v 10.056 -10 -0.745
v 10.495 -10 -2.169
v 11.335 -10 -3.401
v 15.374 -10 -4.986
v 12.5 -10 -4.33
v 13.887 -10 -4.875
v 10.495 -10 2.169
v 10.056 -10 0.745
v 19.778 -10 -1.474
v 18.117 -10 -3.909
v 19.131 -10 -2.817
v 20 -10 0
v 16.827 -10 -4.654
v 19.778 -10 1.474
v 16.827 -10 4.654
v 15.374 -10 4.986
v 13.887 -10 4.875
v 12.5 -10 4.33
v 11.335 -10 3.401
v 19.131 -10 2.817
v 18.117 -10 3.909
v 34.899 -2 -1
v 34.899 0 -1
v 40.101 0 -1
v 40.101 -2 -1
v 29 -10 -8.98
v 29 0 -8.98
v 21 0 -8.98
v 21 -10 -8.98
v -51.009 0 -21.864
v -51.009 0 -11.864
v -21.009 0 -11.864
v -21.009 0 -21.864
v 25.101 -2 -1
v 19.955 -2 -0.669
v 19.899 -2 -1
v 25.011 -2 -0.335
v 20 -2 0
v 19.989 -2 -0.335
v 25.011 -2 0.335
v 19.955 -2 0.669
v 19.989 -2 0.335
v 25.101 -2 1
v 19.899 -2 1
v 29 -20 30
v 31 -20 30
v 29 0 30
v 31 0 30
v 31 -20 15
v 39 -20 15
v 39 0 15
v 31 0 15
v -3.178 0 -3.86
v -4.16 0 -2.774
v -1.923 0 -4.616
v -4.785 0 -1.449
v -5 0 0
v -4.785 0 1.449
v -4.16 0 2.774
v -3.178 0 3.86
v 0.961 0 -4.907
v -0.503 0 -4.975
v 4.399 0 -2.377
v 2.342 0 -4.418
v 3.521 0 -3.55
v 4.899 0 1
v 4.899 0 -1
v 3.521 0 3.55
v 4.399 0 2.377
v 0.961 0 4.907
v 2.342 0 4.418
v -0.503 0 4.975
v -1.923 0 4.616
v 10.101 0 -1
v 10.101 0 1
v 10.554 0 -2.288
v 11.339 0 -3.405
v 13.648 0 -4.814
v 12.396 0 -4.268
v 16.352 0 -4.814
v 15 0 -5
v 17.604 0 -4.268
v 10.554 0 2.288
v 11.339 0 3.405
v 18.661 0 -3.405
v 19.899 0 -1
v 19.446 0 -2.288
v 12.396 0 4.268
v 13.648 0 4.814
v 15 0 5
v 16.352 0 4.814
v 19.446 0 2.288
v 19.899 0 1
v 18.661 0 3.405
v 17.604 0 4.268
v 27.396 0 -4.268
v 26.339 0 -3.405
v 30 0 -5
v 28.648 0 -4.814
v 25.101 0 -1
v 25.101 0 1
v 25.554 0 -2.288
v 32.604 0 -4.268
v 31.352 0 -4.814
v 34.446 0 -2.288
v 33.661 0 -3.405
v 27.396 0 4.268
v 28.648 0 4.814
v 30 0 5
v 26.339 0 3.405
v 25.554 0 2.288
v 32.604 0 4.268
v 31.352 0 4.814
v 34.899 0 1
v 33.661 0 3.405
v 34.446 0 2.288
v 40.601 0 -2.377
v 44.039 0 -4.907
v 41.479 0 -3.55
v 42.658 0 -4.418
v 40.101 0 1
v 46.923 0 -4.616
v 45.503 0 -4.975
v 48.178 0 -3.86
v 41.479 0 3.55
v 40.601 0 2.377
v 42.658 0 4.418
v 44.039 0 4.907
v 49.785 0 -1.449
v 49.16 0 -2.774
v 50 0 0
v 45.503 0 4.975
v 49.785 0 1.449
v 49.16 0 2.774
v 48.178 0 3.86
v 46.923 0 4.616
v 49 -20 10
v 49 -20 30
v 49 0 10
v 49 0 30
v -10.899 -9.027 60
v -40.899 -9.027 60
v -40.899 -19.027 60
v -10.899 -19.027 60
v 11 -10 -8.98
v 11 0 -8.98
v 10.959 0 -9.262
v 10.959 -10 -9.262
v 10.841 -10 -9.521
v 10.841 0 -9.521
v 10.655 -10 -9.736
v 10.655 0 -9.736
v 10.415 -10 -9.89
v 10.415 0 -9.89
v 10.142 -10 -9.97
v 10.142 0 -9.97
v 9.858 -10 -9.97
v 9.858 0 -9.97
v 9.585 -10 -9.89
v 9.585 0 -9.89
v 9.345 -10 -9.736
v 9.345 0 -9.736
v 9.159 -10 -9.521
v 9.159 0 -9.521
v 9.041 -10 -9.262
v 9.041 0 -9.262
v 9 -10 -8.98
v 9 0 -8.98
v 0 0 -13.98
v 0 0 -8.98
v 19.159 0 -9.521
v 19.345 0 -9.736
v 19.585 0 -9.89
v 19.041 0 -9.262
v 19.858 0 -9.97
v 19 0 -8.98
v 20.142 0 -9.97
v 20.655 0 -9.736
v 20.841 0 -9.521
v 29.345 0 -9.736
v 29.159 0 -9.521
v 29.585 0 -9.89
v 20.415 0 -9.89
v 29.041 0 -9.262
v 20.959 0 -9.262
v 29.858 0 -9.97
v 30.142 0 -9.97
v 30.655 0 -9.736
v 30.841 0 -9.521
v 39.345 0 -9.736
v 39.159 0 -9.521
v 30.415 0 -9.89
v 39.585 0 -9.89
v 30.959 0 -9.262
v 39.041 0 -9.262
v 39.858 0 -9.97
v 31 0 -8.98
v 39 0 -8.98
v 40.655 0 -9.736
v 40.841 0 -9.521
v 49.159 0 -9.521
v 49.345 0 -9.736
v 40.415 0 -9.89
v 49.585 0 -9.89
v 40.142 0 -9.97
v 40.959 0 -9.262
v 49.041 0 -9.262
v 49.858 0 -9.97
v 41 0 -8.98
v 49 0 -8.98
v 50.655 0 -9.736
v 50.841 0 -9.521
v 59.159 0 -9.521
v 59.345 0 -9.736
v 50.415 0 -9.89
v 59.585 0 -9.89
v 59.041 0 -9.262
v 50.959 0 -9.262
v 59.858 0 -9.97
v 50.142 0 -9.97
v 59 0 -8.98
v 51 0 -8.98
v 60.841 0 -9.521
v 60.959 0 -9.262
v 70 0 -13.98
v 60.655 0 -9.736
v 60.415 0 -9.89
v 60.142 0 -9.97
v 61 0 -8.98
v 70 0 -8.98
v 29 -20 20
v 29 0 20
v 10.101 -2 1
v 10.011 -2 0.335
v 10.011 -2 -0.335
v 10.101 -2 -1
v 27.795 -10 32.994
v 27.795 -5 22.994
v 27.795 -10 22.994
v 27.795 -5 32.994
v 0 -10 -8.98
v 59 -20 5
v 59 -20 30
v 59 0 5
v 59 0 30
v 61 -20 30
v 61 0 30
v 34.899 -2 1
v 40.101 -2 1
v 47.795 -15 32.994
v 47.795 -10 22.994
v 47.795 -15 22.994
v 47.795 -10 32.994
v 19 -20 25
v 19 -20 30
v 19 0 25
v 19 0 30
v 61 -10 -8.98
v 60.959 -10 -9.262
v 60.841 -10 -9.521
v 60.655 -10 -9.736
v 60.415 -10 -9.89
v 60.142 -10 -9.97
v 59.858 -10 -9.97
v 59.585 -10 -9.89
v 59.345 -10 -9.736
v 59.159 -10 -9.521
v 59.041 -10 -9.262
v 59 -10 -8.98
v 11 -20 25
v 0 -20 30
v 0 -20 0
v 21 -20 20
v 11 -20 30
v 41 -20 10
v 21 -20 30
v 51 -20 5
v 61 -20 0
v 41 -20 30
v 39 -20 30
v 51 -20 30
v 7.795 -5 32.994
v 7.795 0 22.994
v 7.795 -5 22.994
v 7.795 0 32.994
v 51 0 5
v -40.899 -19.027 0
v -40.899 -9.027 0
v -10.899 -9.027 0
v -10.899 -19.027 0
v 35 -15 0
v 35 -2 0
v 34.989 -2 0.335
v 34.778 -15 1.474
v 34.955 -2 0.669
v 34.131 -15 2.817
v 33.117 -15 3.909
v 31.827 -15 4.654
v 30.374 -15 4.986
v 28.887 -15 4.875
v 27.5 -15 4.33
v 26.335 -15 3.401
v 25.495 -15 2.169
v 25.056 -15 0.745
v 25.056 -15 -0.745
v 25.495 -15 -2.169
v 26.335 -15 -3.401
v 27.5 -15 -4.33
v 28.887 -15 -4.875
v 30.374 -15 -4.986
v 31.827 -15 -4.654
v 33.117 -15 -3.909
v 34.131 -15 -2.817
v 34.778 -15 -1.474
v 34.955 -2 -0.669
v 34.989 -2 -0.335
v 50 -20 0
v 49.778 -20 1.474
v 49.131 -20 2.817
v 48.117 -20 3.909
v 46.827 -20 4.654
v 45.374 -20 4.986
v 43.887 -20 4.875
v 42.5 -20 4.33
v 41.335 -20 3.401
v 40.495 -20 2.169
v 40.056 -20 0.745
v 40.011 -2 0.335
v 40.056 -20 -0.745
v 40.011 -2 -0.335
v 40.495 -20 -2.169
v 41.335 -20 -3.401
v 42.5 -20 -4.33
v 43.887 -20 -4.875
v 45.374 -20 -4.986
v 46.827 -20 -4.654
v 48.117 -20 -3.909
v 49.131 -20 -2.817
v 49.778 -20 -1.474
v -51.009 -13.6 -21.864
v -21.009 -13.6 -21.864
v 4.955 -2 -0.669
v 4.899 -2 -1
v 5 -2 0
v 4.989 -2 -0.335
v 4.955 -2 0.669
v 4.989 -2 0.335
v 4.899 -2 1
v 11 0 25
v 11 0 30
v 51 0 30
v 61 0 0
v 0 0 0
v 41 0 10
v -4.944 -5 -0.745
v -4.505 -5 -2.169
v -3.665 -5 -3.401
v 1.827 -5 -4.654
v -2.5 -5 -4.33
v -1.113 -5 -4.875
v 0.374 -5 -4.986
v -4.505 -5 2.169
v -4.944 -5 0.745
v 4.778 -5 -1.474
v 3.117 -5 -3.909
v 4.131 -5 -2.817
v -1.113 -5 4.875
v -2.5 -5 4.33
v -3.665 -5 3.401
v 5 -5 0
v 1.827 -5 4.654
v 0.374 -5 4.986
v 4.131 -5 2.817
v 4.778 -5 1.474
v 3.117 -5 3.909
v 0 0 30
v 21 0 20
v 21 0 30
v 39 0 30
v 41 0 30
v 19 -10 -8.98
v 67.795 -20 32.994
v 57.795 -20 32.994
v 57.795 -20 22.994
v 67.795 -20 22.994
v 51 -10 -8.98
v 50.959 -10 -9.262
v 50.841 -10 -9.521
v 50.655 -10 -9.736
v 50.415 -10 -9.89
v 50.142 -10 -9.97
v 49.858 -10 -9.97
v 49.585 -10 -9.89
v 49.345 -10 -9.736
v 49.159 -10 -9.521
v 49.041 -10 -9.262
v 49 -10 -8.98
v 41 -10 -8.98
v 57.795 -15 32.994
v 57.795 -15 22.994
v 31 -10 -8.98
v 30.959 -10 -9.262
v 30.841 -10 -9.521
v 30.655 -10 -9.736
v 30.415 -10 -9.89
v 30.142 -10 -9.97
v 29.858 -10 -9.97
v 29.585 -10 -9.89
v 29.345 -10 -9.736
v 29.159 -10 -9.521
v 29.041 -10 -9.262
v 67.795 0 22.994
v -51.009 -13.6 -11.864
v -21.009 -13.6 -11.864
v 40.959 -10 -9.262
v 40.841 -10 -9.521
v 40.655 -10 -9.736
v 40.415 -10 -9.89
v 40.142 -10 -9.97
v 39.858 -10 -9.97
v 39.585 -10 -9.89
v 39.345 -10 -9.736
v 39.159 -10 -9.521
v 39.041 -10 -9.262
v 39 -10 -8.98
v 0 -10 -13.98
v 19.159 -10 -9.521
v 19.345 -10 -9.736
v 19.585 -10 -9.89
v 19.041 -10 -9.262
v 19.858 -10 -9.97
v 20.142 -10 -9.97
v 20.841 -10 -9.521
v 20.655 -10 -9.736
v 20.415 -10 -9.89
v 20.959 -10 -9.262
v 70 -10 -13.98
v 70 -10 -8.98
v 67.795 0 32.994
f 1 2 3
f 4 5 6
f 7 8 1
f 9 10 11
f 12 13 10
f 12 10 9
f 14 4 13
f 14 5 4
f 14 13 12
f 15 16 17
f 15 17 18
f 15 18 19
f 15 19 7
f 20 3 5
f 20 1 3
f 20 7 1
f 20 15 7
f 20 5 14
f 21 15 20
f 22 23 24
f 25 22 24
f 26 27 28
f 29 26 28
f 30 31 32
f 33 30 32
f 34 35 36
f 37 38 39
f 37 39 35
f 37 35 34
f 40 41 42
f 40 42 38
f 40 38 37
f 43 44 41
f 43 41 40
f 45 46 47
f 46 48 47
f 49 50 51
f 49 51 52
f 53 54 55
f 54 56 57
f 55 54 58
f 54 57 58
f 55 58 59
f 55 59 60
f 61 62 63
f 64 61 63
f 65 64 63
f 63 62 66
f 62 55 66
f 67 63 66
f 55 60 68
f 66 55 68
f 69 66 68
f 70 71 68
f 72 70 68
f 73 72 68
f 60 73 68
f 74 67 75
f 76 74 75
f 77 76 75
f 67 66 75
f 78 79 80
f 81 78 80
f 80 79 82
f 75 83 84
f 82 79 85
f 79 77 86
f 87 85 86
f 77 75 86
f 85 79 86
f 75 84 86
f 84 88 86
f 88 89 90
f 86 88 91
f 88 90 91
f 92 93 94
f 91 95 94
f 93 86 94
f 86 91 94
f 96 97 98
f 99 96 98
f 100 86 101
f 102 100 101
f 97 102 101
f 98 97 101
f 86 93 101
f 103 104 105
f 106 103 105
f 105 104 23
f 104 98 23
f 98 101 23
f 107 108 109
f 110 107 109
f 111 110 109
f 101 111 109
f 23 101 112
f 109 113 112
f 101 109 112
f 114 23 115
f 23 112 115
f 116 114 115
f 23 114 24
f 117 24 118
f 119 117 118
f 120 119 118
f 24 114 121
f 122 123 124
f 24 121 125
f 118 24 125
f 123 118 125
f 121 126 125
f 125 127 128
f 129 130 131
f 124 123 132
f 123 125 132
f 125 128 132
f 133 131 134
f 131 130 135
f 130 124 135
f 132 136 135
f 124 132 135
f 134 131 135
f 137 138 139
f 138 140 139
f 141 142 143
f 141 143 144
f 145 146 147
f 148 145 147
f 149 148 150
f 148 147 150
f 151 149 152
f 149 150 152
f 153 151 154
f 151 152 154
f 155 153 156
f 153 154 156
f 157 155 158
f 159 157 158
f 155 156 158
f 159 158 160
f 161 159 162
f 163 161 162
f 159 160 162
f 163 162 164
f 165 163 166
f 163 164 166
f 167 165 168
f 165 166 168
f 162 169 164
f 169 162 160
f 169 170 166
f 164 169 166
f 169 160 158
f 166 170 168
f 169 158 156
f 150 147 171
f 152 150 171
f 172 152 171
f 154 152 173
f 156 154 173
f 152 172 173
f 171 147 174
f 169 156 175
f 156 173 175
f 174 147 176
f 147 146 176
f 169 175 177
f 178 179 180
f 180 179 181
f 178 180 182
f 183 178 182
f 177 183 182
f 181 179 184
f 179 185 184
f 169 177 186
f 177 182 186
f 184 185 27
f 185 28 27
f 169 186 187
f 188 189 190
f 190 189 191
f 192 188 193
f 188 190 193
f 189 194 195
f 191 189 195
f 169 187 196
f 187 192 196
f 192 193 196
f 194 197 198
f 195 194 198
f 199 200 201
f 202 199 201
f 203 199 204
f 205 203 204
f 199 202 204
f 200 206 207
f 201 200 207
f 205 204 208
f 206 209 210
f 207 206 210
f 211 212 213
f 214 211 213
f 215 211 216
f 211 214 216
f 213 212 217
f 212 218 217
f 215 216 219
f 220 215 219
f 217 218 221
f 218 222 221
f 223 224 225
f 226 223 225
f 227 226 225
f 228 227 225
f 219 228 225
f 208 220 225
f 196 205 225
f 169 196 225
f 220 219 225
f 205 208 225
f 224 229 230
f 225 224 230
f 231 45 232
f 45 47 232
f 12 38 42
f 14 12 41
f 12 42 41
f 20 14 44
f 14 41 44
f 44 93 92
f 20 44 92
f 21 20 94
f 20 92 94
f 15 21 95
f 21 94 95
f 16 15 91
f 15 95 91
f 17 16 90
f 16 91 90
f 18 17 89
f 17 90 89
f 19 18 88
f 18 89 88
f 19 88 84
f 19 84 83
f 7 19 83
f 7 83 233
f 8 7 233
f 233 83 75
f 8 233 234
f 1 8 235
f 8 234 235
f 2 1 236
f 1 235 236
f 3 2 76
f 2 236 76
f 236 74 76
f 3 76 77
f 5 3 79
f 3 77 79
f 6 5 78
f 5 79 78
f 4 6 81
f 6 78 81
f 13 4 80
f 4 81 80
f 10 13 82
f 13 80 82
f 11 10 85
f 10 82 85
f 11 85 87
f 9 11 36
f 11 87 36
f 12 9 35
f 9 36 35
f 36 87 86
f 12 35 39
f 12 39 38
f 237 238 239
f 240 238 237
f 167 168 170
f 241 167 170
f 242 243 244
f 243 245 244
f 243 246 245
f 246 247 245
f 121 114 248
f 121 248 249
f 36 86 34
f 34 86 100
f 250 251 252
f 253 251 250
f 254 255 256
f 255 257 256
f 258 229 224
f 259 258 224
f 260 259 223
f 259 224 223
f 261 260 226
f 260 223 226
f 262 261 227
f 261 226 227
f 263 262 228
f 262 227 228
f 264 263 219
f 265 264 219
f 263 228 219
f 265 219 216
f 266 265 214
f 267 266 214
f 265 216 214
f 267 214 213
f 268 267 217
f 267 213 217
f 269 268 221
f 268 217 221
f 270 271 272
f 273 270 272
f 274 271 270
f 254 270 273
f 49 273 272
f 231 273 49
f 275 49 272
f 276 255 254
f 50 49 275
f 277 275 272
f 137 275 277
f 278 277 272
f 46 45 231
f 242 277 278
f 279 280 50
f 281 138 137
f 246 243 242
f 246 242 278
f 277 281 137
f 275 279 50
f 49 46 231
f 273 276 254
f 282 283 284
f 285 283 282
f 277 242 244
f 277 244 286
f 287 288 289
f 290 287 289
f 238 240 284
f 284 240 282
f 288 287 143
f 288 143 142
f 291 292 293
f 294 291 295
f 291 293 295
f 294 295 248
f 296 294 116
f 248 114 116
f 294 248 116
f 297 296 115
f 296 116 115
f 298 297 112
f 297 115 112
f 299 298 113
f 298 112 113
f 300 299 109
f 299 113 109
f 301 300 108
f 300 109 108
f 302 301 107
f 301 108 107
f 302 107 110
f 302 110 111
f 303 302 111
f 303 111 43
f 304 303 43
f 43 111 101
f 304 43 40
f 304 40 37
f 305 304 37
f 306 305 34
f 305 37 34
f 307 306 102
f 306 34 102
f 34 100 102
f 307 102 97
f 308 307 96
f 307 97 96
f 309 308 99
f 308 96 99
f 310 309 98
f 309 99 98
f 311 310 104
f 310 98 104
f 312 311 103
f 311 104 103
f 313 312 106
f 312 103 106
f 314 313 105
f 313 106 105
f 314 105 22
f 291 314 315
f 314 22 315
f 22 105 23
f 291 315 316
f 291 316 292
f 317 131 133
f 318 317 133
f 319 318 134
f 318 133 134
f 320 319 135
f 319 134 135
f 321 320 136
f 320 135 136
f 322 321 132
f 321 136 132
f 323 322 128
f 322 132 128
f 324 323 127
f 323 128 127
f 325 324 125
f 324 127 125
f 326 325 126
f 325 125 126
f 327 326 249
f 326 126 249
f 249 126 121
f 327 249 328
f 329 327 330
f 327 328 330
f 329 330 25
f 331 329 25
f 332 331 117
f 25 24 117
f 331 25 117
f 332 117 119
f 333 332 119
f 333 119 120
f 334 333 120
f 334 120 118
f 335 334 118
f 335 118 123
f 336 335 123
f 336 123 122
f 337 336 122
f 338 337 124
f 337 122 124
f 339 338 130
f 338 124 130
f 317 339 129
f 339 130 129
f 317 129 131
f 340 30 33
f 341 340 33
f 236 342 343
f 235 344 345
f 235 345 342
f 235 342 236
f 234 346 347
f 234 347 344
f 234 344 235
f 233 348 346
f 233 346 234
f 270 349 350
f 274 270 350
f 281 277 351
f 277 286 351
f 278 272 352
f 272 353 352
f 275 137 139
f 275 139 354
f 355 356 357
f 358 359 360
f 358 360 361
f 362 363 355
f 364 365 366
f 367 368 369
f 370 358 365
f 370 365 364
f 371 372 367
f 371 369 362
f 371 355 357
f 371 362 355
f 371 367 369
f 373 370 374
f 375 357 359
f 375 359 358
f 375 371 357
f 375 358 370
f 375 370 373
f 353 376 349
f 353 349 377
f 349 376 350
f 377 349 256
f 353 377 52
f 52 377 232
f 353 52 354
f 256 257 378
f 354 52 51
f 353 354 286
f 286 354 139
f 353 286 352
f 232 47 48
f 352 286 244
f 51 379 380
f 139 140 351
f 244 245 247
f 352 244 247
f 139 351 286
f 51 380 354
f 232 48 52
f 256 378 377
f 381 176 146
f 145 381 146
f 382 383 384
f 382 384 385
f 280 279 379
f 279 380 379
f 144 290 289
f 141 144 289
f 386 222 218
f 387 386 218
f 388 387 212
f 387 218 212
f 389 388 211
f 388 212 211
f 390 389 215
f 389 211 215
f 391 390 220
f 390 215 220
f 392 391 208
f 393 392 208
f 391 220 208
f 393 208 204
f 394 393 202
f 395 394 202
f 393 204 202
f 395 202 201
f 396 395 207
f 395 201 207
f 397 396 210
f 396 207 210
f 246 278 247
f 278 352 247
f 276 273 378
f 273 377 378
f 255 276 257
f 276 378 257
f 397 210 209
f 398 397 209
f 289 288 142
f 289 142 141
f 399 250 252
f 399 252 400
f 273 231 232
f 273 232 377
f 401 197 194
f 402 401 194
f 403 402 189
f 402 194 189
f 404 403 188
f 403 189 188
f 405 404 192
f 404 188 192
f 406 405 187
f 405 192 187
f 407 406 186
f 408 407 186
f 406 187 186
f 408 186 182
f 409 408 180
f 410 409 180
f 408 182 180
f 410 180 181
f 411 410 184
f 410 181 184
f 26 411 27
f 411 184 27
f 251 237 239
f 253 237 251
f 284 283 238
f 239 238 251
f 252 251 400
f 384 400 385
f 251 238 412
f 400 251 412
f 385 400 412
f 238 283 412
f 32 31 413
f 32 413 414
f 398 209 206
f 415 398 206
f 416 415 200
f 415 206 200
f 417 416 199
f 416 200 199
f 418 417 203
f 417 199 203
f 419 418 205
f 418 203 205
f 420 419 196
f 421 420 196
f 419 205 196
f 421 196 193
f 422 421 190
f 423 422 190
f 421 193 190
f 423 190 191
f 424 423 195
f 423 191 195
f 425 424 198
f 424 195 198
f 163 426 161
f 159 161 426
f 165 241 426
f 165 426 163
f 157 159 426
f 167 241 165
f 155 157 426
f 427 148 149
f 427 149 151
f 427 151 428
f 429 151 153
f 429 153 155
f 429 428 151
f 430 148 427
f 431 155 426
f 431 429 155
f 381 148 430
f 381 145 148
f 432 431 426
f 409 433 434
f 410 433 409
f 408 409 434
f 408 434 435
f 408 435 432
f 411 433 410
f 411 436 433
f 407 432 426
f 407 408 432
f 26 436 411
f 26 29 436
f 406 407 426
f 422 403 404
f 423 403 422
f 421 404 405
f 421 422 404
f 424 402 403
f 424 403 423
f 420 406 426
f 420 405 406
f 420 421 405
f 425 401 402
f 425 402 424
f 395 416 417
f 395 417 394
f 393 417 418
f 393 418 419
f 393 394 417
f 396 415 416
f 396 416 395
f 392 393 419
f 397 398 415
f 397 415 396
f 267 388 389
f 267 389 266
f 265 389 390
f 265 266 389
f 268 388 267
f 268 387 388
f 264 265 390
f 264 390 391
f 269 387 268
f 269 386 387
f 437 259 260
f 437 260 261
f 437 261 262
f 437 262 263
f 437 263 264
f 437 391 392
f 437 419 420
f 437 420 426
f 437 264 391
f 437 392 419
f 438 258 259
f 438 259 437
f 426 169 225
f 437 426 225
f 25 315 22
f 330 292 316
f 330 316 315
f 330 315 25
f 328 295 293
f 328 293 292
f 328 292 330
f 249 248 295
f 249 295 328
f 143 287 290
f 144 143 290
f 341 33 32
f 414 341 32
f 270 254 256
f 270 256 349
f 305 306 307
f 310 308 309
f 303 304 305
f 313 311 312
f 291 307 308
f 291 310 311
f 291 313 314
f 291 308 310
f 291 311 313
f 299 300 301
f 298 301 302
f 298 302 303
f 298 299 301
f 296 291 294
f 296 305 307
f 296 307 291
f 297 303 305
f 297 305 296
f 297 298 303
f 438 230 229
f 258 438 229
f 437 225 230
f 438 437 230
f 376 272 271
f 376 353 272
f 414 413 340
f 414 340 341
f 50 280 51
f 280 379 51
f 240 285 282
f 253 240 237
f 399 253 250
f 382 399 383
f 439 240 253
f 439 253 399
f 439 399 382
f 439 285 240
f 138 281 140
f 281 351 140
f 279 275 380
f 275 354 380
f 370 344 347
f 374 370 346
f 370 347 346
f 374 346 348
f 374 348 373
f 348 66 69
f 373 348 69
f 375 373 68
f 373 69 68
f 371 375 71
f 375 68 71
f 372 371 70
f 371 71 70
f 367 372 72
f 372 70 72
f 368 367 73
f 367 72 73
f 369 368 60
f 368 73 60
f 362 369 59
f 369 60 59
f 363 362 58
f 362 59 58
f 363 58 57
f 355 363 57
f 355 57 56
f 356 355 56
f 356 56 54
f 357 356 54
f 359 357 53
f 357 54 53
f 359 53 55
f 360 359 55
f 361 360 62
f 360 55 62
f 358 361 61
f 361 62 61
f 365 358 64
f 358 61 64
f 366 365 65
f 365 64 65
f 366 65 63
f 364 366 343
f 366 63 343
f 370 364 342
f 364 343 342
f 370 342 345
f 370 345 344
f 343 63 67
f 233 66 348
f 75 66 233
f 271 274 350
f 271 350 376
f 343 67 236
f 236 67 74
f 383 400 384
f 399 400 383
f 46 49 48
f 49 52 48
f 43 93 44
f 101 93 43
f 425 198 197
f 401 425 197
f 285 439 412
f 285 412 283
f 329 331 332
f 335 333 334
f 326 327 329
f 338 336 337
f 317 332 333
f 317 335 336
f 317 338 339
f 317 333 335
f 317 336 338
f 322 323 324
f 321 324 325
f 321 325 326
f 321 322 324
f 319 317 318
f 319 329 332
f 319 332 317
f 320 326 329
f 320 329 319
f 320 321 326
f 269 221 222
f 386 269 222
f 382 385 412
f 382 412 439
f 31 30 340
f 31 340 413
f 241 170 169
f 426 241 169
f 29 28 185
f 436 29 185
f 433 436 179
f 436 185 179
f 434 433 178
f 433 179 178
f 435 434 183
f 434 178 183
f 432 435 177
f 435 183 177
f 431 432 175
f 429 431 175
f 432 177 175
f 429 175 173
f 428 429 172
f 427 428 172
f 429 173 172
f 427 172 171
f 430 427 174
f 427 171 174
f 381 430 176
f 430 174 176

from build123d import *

# Parameters (mm, degrees)
F0_R      = 5
F1_DEPTH  = 5
F2_DEPTH  = 10
F3_DEPTH  = 15
F4_DEPTH  = 20
F7_W      = 60
F7_H      = 10
F8_DEPTH  = 5
F9_W      = 40
F9_H      = 10
F10_DEPTH = 5
F11_W     = 20
F11_H     = 10
F12_DEPTH = 5
F13_W     = 10
F13_H     = 10
F14_DEPTH = 5
F15_W     = 44.9199787766
F15_H     = 2
F16_DEPTH = 2
F17_W     = 30
F17_H     = 10
F18_DEPTH = 60
F19_W     = 9
F19_H     = 30
F19_W_2   = 8
F19_H_2   = 25
F19_W_3   = 1
F19_H_3   = 5
F19_H_4   = 20
F19_H_5   = 15
F19_H_6   = 10
F20_DEPTH = 10
F21_DEPTH = 10
F22_W     = 30
F22_H     = 10
F23_DEPTH = 13.6


# Not quite as in the source:
# - a feature names something its author has since deleted; it is built from what else it names


with BuildPart() as f1:
    # F0 (on Front) → F1 (new body)
    with BuildSketch(Plane.XZ):
        Circle(F0_R)
    extrude(amount=F1_DEPTH)


with BuildPart() as f2:
    # F0 (on Front) → F2 (new body)
    with BuildSketch(Plane.XZ):
        with Locations((15, 0)):
            Circle(F0_R)
    extrude(amount=F2_DEPTH)


with BuildPart() as f3:
    # F0 (on Front) → F3 (new body)
    with BuildSketch(Plane.XZ):
        with Locations((30, 0)):
            Circle(F0_R)
    extrude(amount=F3_DEPTH)


with BuildPart() as f4:
    # F0 (on Front) → F4 (new body)
    with BuildSketch(Plane.XZ):
        with Locations((45, 0)):
            Circle(F0_R)
    extrude(amount=F4_DEPTH)

    # F6: union F3, F2, F1
    add(f3.part)
    add(f2.part)
    add(f1.part)

    # F15 (on face) → F16 (join)
    with BuildSketch(Plane.XZ):
        with Locations((22.7489862844, 0)):
            Rectangle(F15_W, F15_H)
    extrude(amount=F16_DEPTH)


with BuildPart() as f8:
    # F7 (on face) → F8 (new body)
    with BuildSketch(Plane(origin=(0, 0, 0), x_dir=(-1, 0, 0), z_dir=(0, 1, 0))):
        with Locations((-37.7946806746, 27.9940228151)):
            Rectangle(F7_W, F7_H)
    extrude(amount=-F8_DEPTH)

    # F9 (on face) → F10 (join)
    with BuildSketch(Plane.XZ.offset(5)):
        with Locations((47.7946806746, 27.9940228151)):
            Rectangle(F9_W, F9_H)
    extrude(amount=F10_DEPTH)

    # F11 (on face) → F12 (join)
    with BuildSketch(Plane.XZ.offset(10)):
        with Locations((57.7946806746, 27.9940228151)):
            Rectangle(F11_W, F11_H)
    extrude(amount=F12_DEPTH)

    # F13 (on face) → F14 (join)
    with BuildSketch(Plane.XZ.offset(15)):
        with Locations((62.7946806746, 27.9940228151)):
            Rectangle(F13_W, F13_H)
    extrude(amount=F14_DEPTH)


with BuildPart() as f18:
    # F17 (on Top) → F18 (new body)
    with BuildSketch(Plane.XY):
        with Locations((-25.8990339628, -14.026532881)):
            Rectangle(F17_W, F17_H)
    extrude(amount=F18_DEPTH)


with BuildPart() as f20:
    # F19 (on Front) → F20 (new body)
    with BuildSketch(Plane.XZ):
        with Locations((4.5, 15)):
            Rectangle(F19_W, F19_H)
        Polygon((9, 30), (9, 0), (11, 0), (11, 25), (10, 25), (10, 30), align=None)
        with Locations((15, 12.5)):
            Rectangle(F19_W_2, F19_H_2)
        Polygon((19, 25), (19, 0), (21, 0), (21, 20), (20, 20), (20, 25), align=None)
        with Locations((10.5, 27.5)):
            Rectangle(F19_W_3, F19_H_3)
        with Locations((25, 10)):
            Rectangle(F19_W_2, F19_H_4)
        Polygon((19, 30), (19, 25), (20, 25), (20, 20), (21, 20), (21, 30), align=None)
        Polygon((29, 20), (29, 0), (31, 0), (31, 15), (30, 15), (30, 20), align=None)
        with Locations((35, 7.5)):
            Rectangle(F19_W_2, F19_H_5)
        Polygon((29, 30), (29, 20), (30, 20), (30, 15), (31, 15), (31, 30), align=None)
        Polygon((39, 15), (39, 0), (41, 0), (41, 10), (40, 10), (40, 15), align=None)
        with Locations((45, 5)):
            Rectangle(F19_W_2, F19_H_6)
        Polygon((39, 30), (39, 15), (40, 15), (40, 10), (41, 10), (41, 30), align=None)
        Polygon((49, 10), (49, 0), (51, 0), (51, 5), (50, 5), (50, 10), align=None)
        with Locations((55, 2.5)):
            Rectangle(F19_W_2, F19_H_3)
        Polygon((49, 30), (49, 10), (50, 10), (50, 5), (51, 5), (51, 30), align=None)
        with Locations((59.5, 2.5)):
            Rectangle(F19_W_3, F19_H_3)
        Polygon((60, 5), (60, 0), (61, 0), (61, 30), (59, 30), (59, 5), align=None)
    extrude(amount=F20_DEPTH)

    # F21 (add): a face of the model
    f21_faces = [f20.faces().sort_by_distance(p)[0] for p in [
        (25.0528455285, -10, 12.1544715447),
    ]]
    extrude(f21_faces, amount=F21_DEPTH)


with BuildPart() as f20b:
    # F19 (on Front) → F20, piece 2 (new body)
    with BuildSketch(Plane.XZ):
        with BuildLine():
            Line((9, -8.9803234488), (0, -8.9803234488))
            Line((0, -8.9803234488), (0, -13.9803234488))
            Line((0, -13.9803234488), (70, -13.9803234488))
            Line((70, -13.9803234488), (70, -8.9803234488))
            Line((70, -8.9803234488), (61, -8.9803234488))
            ThreePointArc((61, -8.9803234488), (60, -9.9803234488), (59, -8.9803234488))
            Line((59, -8.9803234488), (51, -8.9803234488))
            ThreePointArc((51, -8.9803234488), (50, -9.9803234488), (49, -8.9803234488))
            Line((49, -8.9803234488), (41, -8.9803234488))
            ThreePointArc((41, -8.9803234488), (40, -9.9803234488), (39, -8.9803234488))
            Line((39, -8.9803234488), (31, -8.9803234488))
            ThreePointArc((31, -8.9803234488), (30, -9.9803234488), (29, -8.9803234488))
            Line((29, -8.9803234488), (21, -8.9803234488))
            ThreePointArc((21, -8.9803234488), (20, -9.9803234488), (19, -8.9803234488))
            Line((19, -8.9803234488), (11, -8.9803234488))
            ThreePointArc((11, -8.9803234488), (10, -9.9803234488), (9, -8.9803234488))
        make_face()
    extrude(amount=F20_DEPTH)


with BuildPart() as f23:
    # F22 (on Front) → F23 (new body)
    with BuildSketch(Plane.XZ):
        with Locations((-36.0085070133, -16.8644682813)):
            Rectangle(F22_W, F22_H)
    extrude(amount=F23_DEPTH)


solid = Compound([f4.part, f8.part, f18.part, f20.part, f20b.part, f23.part])
